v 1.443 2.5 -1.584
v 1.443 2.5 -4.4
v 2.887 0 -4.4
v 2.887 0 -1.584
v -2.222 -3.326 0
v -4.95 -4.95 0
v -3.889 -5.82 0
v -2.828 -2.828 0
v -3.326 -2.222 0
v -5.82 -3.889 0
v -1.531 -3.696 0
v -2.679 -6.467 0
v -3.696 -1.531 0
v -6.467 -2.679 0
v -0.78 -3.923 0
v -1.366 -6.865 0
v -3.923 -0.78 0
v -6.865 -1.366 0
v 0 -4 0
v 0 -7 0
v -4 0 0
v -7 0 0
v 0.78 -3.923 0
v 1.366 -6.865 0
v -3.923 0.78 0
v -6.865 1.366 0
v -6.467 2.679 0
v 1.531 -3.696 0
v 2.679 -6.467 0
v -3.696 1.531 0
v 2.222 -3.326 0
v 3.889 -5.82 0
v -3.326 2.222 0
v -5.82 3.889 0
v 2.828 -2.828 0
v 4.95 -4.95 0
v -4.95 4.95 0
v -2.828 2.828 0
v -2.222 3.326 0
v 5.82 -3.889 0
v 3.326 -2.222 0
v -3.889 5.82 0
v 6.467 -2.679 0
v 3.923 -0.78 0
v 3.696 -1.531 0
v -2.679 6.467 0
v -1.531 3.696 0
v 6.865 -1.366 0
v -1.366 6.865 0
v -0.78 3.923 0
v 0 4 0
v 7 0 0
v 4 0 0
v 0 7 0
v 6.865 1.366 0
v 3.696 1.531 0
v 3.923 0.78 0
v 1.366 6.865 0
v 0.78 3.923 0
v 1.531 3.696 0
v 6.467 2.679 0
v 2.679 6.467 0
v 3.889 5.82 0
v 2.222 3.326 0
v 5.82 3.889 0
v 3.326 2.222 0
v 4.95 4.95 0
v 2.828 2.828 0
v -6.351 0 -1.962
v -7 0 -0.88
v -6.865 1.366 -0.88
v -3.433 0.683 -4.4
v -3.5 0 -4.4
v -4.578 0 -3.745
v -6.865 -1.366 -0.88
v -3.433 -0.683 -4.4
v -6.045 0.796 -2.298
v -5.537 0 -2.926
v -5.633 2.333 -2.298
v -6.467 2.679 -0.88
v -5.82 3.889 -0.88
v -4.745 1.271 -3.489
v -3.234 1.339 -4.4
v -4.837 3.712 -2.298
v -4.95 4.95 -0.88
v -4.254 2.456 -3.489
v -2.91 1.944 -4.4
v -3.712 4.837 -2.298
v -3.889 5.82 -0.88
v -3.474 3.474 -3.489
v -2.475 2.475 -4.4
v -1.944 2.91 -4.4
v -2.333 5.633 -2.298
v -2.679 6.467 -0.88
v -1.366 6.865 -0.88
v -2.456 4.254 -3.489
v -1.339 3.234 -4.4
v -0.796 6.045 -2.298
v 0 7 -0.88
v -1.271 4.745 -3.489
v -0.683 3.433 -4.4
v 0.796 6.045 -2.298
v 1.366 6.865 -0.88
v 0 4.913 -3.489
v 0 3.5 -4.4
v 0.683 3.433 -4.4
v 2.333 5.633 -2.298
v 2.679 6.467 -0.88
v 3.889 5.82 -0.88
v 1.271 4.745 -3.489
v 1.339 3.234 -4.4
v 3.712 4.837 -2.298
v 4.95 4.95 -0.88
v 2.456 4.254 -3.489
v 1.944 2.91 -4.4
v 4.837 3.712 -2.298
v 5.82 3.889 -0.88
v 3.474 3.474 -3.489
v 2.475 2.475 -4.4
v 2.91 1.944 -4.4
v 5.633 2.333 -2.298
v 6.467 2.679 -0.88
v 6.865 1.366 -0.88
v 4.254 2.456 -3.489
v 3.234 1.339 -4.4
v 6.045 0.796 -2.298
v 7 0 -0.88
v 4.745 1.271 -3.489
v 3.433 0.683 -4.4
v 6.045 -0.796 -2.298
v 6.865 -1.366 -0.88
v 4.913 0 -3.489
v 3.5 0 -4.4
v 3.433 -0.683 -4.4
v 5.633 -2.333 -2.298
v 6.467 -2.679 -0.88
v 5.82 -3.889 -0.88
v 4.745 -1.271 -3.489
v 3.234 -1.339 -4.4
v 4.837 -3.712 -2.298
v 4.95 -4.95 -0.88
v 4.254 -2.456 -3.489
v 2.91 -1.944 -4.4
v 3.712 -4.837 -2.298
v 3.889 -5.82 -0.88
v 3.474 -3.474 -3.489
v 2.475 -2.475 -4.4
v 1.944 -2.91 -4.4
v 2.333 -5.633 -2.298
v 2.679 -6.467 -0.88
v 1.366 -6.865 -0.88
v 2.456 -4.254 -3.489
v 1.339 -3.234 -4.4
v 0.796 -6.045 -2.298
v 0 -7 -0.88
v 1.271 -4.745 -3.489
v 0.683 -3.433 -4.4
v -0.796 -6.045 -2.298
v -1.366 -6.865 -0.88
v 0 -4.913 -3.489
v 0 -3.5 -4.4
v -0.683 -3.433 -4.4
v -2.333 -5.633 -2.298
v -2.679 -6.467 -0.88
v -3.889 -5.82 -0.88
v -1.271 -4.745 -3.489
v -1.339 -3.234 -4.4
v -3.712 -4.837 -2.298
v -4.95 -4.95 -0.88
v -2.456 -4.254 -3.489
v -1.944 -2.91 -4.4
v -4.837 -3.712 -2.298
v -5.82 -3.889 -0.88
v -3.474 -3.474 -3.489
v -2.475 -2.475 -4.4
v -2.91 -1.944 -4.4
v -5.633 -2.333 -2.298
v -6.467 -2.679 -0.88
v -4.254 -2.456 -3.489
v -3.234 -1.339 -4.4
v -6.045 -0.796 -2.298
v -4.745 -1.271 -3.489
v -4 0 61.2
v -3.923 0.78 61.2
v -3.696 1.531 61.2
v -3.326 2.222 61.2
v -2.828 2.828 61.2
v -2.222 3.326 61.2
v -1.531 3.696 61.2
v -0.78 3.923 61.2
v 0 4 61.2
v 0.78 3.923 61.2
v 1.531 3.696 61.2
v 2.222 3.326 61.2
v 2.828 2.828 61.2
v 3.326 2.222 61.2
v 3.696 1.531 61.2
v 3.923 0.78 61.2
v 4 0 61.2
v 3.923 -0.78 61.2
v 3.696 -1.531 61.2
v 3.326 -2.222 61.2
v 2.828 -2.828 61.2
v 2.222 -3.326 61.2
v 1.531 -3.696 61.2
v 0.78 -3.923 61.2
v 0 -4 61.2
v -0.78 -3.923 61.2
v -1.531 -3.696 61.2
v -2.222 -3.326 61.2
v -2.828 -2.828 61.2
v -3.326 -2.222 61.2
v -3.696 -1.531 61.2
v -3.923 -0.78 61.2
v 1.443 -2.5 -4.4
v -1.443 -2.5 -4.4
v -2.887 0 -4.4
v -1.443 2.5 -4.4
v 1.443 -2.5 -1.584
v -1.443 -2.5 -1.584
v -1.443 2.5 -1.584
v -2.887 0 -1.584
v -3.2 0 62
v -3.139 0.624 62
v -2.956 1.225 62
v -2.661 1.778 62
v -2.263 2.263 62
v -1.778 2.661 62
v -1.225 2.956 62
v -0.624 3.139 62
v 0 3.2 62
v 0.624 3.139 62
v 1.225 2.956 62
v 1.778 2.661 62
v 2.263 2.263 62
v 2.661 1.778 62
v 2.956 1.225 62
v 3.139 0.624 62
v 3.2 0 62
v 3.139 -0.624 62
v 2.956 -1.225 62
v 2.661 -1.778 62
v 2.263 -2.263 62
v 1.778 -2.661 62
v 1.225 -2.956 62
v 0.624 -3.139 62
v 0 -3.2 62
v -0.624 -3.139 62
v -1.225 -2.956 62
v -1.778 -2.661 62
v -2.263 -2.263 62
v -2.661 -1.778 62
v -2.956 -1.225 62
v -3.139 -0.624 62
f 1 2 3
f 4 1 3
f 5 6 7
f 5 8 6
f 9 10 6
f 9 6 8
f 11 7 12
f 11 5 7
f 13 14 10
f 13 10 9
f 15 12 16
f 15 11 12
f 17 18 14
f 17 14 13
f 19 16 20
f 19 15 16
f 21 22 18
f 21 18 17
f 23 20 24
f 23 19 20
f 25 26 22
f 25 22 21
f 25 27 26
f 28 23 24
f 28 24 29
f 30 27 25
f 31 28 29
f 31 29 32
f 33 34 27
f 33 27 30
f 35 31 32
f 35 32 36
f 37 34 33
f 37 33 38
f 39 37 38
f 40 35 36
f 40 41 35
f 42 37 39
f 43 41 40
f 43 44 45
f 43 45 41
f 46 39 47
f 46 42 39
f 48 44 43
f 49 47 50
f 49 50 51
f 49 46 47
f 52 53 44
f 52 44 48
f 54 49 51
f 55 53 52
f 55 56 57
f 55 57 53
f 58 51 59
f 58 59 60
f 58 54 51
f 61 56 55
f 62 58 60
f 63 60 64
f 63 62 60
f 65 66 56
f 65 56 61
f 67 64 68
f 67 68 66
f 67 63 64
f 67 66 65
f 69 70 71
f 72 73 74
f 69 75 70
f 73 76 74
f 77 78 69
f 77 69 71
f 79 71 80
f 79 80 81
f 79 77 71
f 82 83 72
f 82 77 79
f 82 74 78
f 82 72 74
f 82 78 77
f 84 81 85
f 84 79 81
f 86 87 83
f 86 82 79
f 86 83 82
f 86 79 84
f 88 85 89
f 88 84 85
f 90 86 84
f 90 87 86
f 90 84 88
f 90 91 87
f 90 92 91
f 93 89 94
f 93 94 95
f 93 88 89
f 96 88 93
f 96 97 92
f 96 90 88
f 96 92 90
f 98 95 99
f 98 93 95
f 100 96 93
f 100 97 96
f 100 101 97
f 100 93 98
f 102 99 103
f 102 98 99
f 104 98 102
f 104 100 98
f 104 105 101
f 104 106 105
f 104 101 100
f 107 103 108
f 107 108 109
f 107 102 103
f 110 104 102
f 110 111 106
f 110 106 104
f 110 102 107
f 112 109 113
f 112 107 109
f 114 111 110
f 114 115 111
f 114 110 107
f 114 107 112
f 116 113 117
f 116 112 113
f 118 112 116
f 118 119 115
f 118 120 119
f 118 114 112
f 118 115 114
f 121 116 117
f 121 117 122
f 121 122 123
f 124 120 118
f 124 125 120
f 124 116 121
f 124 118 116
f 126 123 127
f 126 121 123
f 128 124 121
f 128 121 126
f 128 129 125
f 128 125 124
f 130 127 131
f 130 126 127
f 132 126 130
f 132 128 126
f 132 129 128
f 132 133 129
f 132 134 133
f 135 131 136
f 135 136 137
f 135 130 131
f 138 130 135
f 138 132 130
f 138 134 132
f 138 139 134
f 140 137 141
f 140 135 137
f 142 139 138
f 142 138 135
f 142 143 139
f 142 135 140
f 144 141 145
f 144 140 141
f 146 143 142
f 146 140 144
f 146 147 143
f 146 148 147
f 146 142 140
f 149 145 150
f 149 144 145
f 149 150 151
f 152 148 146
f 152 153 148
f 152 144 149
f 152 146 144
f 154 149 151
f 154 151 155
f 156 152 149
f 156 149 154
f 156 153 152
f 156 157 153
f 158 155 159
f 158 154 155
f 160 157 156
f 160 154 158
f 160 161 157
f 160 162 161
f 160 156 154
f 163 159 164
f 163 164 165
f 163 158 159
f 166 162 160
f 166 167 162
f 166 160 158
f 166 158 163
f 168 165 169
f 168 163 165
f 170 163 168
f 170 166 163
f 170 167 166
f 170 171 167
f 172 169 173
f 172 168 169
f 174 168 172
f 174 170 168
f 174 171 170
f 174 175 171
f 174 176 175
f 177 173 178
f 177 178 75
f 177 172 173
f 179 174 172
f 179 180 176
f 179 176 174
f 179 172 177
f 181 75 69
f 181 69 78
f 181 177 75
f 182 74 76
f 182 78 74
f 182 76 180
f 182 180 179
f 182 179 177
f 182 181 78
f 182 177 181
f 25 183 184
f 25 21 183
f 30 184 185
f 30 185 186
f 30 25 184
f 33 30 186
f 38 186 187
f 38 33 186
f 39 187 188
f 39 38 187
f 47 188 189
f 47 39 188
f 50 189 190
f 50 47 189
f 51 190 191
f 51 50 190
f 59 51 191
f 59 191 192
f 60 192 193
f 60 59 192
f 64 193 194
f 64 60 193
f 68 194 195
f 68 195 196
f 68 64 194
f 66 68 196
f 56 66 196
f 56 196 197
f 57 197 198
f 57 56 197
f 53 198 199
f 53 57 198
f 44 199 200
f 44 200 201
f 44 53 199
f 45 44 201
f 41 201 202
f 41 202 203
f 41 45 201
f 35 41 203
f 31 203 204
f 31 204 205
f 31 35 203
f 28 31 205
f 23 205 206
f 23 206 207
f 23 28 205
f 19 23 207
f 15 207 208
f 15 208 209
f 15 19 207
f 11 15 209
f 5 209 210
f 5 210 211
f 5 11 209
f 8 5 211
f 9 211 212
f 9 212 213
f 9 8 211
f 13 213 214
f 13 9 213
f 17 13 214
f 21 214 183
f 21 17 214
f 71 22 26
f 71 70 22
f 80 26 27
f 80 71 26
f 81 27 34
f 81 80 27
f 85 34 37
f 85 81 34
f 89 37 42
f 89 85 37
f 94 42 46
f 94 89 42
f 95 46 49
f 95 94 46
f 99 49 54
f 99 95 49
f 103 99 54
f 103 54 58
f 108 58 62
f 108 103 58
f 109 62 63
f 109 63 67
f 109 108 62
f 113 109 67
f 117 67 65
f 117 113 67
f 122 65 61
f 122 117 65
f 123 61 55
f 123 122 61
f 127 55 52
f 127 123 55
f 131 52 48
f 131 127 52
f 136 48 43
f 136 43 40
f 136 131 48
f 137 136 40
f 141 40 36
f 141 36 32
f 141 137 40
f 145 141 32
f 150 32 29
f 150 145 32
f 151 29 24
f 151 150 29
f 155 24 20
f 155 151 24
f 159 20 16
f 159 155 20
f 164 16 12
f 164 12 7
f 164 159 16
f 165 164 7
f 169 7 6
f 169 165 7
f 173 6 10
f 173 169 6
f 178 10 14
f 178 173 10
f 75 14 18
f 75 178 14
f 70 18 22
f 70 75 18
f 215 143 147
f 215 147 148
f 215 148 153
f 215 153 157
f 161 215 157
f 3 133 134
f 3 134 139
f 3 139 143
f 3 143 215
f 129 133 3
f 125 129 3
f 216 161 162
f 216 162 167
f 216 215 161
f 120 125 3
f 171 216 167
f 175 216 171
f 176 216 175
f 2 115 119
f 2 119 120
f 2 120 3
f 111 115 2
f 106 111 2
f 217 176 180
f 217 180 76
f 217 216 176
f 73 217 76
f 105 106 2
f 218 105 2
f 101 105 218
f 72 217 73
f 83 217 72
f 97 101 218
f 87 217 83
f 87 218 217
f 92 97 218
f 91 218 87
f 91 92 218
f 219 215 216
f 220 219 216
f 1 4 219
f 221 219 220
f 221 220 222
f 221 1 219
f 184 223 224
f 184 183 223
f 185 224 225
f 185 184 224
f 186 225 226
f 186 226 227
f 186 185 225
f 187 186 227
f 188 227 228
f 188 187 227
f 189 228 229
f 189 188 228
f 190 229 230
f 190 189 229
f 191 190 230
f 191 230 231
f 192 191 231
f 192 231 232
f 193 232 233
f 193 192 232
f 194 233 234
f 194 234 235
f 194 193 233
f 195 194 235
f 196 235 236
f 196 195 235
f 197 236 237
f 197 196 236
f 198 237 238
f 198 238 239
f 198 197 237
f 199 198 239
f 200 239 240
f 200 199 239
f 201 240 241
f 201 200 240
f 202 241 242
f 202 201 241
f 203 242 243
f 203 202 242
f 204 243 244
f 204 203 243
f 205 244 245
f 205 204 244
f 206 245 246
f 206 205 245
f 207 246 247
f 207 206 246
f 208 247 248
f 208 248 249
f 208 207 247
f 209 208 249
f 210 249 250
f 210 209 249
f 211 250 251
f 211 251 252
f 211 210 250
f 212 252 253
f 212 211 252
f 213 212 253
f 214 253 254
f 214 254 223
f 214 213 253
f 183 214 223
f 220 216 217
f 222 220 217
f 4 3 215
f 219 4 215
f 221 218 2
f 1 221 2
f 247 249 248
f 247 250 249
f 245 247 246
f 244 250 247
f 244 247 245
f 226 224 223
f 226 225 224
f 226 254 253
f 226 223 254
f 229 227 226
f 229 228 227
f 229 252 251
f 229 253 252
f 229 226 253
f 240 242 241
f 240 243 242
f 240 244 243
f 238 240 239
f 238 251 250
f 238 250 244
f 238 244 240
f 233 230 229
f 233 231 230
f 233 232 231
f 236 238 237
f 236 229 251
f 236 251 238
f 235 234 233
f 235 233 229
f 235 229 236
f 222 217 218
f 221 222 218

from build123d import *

# Parameters (mm, degrees)
HEX_2_DEPTH = 2.816


with BuildPart() as part:
    # sk3 → br (revolve)
    with BuildSketch(Plane(origin=(0, 0, 0), x_dir=(0, 0, -1), z_dir=(1, 0, 0)), mode=Mode.PRIVATE) as br_sk:
        Polygon((-62, 3.2), (-61.2, 4), (0, 4), (0, 0), (-62, 0), align=None)
    revolve(br_sk.sketch.rotate(Axis((0, 0, 0), (0, 0, -1)), 270), axis=Axis((0, 0, 0), (0, 0, -1)))  # turned: the seam where the file's is

    # sk1 → hd (revolve)
    with BuildSketch(Plane.ZY, mode=Mode.PRIVATE) as hd_sk:
        with BuildLine():
            Line((0, 0), (0, 7))
            Line((0, 7), (-0.88, 7))
            ThreePointArc((-0.88, 7), (-2.92552474, 5.53715631), (-4.4, 3.5))
            Line((-4.4, 3.5), (-4.4, 0))
            Line((-4.4, 0), (0, 0))
        make_face()
    revolve(hd_sk.sketch.rotate(Axis((0, 0, 0), (0, 0, -1)), 270), axis=Axis((0, 0, 0), (0, 0, -1)))  # turned: the seam where the file's is

    # sk2 → hex 2 (cut)
    with BuildSketch(Plane(origin=(0, 0, -4.4), x_dir=(-1, 0, 0), z_dir=(0, 0, -1))):
        Polygon((1.443375673, 2.5), (-1.443375673, 2.5), (-2.886751346, 0), (-1.443375673, -2.5), (1.443375673, -2.5), (2.886751346, 0), align=None)
    extrude(amount=-HEX_2_DEPTH, mode=Mode.SUBTRACT)


solid = part.part
